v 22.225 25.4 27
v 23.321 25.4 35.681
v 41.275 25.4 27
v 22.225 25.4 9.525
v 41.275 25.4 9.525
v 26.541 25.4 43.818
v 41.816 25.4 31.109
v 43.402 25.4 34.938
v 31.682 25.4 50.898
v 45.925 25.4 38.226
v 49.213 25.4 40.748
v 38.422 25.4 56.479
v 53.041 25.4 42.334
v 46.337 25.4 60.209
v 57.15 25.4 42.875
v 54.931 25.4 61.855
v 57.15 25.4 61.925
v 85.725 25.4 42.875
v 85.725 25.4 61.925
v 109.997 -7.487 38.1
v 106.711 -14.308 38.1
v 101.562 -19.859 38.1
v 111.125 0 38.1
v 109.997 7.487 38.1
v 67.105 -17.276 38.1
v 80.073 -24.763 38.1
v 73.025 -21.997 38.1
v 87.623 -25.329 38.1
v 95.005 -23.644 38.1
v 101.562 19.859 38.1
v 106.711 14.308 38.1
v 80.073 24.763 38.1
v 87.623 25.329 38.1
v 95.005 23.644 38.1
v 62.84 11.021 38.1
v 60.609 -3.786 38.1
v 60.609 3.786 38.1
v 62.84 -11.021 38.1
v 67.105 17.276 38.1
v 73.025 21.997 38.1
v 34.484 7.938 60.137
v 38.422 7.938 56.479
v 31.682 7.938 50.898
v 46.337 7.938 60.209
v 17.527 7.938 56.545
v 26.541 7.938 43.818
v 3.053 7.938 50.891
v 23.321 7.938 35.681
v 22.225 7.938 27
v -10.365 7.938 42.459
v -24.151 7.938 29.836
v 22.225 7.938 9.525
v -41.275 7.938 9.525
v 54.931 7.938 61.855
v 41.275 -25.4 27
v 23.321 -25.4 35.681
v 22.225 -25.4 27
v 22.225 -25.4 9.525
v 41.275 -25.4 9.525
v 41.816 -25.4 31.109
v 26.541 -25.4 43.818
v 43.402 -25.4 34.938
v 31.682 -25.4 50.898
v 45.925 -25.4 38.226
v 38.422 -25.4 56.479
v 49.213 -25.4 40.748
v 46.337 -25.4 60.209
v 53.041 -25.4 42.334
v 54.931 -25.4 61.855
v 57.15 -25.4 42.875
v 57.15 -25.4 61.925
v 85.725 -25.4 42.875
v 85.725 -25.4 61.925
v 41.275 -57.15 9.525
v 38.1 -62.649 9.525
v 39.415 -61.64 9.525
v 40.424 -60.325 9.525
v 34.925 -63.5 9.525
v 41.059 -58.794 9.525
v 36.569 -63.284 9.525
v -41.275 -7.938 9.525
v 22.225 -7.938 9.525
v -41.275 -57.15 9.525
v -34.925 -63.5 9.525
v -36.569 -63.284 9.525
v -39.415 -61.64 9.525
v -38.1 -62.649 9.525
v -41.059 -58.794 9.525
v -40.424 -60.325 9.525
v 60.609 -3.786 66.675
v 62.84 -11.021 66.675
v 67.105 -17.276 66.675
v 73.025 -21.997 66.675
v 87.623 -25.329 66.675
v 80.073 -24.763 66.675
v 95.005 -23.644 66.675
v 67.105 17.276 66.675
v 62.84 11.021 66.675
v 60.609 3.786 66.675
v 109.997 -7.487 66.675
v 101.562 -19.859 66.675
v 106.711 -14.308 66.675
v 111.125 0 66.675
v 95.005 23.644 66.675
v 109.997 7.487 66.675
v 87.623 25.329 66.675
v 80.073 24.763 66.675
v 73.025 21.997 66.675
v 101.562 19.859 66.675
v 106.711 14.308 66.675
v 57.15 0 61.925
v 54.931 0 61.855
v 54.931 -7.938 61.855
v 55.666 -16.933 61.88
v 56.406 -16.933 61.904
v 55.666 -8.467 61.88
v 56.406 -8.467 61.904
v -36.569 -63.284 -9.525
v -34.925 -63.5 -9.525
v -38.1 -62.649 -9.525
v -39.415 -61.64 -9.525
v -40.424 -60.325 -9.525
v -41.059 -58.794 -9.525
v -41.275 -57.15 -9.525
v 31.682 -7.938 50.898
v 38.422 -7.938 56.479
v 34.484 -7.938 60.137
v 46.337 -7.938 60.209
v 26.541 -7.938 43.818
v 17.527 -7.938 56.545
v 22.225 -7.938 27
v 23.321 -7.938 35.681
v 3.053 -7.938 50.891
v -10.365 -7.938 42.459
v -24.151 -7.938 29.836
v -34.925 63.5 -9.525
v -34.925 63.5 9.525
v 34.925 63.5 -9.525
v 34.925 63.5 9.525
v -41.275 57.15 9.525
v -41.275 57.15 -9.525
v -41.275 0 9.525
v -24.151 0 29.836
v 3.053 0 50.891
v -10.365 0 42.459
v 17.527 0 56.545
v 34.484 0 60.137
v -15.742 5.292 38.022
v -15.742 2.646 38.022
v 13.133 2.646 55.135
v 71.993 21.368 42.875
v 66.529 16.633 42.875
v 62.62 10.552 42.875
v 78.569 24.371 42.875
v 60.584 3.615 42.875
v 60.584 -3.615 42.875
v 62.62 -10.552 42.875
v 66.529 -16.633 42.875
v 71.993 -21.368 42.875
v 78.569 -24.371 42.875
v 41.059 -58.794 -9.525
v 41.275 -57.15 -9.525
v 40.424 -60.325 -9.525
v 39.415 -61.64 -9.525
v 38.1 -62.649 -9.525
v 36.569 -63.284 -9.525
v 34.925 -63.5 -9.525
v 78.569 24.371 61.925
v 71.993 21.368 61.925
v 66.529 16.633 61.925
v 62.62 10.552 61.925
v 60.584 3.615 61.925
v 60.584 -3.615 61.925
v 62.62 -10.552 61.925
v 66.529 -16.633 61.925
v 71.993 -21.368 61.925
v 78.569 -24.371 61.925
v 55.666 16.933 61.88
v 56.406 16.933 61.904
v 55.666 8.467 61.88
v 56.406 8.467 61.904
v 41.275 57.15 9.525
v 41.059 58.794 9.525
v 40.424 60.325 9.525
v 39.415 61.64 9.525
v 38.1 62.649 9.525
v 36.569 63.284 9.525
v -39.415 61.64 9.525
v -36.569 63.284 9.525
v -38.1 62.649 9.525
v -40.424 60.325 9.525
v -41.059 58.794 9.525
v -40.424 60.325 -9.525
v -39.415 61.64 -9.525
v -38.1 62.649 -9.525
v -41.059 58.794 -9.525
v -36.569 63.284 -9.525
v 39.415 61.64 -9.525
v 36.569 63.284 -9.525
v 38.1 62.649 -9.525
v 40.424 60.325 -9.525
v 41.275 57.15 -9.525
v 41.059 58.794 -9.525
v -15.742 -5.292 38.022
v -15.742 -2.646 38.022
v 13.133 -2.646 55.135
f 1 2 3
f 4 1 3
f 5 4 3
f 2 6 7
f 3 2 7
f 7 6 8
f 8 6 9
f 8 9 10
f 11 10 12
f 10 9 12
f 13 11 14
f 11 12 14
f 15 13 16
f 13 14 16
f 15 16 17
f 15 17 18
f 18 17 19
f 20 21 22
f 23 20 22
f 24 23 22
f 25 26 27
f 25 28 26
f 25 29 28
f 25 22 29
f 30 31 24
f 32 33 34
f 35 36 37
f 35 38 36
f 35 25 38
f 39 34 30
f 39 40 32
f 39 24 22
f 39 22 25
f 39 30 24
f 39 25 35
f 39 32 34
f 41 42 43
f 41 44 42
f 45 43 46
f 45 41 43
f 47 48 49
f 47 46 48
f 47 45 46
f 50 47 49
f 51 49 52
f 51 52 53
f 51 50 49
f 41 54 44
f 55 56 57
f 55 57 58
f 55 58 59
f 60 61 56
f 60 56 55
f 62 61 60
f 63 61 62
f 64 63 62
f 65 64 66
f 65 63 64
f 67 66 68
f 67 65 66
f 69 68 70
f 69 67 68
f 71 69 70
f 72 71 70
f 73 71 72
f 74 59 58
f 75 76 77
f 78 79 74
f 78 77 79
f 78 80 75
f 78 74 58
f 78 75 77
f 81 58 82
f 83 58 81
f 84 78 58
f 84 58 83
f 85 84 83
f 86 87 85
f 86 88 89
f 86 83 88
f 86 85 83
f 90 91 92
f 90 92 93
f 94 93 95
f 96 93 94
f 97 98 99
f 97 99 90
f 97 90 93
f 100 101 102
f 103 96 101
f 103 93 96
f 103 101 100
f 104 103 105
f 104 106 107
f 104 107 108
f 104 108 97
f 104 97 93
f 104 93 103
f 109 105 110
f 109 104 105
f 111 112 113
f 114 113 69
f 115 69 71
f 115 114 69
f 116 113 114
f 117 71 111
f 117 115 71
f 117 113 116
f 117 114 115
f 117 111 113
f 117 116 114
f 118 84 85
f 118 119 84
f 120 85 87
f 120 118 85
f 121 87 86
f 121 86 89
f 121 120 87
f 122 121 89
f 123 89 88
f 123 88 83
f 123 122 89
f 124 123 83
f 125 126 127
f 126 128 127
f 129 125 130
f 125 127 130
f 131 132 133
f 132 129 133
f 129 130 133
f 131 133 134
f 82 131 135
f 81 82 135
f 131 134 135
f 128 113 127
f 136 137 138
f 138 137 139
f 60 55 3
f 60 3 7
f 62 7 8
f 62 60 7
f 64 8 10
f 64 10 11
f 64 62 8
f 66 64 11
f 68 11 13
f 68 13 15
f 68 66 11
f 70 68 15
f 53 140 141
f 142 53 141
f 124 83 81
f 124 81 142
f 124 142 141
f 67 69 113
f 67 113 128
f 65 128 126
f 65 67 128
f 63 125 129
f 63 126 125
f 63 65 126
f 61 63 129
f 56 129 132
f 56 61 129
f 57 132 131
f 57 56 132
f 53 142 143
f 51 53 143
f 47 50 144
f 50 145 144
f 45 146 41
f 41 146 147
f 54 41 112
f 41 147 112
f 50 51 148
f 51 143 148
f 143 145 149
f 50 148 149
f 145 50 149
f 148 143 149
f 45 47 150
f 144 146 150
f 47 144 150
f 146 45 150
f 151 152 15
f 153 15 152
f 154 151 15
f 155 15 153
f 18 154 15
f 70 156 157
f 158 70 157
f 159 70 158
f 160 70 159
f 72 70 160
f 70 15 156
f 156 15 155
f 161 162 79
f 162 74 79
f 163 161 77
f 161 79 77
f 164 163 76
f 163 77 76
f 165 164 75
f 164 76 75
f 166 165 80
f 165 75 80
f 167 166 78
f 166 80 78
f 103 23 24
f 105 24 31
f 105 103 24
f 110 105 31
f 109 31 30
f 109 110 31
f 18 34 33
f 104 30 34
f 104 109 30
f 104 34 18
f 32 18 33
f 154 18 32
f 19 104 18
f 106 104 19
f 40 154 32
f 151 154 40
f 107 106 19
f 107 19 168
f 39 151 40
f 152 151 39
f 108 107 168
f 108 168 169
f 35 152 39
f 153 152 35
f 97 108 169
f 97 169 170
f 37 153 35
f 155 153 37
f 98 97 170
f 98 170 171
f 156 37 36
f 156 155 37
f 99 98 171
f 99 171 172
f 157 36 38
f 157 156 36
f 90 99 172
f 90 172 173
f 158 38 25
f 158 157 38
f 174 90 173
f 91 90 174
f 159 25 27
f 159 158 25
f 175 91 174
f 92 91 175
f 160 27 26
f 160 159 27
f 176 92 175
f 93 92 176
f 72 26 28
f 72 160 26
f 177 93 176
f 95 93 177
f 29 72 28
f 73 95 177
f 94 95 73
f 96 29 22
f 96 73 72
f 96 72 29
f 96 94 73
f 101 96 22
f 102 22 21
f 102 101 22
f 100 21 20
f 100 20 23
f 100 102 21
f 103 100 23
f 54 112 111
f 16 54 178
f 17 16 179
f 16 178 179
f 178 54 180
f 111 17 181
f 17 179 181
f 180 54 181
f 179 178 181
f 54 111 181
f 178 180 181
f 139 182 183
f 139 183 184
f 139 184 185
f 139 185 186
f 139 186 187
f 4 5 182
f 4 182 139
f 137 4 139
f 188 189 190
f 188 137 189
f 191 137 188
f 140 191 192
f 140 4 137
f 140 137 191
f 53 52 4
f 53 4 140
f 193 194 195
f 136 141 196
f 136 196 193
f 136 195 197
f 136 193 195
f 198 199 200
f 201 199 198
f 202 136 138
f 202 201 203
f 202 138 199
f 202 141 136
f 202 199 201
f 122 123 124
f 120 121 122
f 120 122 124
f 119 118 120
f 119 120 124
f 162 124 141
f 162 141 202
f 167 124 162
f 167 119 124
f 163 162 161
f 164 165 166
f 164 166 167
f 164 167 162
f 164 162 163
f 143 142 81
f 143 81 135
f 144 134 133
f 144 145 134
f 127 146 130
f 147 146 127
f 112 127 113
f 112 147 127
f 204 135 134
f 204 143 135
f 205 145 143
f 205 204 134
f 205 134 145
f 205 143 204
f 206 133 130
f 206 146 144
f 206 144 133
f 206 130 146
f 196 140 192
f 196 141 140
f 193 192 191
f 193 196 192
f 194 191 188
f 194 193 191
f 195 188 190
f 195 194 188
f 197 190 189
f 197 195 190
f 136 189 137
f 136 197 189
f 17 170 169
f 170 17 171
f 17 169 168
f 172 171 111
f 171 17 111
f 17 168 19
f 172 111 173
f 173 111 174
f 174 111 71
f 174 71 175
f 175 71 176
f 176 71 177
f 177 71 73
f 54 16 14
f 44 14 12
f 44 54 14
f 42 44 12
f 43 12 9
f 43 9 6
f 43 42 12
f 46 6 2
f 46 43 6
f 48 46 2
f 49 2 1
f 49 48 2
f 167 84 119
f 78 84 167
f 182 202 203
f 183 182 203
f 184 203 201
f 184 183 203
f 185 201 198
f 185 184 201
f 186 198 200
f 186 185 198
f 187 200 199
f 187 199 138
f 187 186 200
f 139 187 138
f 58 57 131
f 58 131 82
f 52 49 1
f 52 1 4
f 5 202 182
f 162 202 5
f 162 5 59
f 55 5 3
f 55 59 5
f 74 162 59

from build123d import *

# Parameters (mm, degrees)
F1_DEPTH = 63.5
F2_DEPTH = 25.4
F3_DEPTH = 7.9375
F0_W     = 25.4
F0_H     = 19.05
F4_DEPTH = 25.4
F6_R     = 6.35


with BuildPart() as f1:
    # F0 (on Front) → F1 (new body, symmetric)
    with BuildSketch(Plane.XZ):
        Polygon((22.225, 9.525), (-41.275, 9.525), (-41.275, -9.525), (41.275, -9.525), (41.275, 9.525), align=None)
    extrude(amount=F1_DEPTH, both=True)

    # F0 (on Front) → F2 (join, symmetric)
    with BuildSketch(Plane.XZ):
        with BuildLine():
            Line((22.225, 27.0002), (22.225, 9.525))
            Line((22.225, 9.525), (41.275, 9.525))
            Line((41.275, 9.525), (41.275, 27.0002))
            ThreePointArc((41.275, 27.0002), (45.9246798487, 38.2255201513), (57.15, 42.8752))
            Line((57.15, 42.8752), (60.325, 42.8752))
            Line((60.325, 42.8752), (60.325, 61.9252))
            Line((60.325, 61.9252), (57.15, 61.9252))
            add(Edge.make_bspline(
                [(54.9309637921, 61.854633051), (55.6637542078, 61.8810124388), (56.4033914289, 61.9045304692), (57.15, 61.9252)],
                knots=[109.9388089339, 109.9388089339, 109.9388089339, 109.9388089339, 111.5045361635, 111.5045361635, 111.5045361635, 111.5045361635], degree=3))
            ThreePointArc((54.9309637921, 61.854633051), (31.6818290354, 50.8984822127), (22.225, 27.0002))
        make_face()
    extrude(amount=F2_DEPTH, both=True)

    # F0 (on Front) → F3 (join, symmetric)
    with BuildSketch(Plane.XZ):
        with BuildLine():
            add(Edge.make_bspline(
                [(-41.275, 9.525), (-14.2194517609, 44.0428960459), (3.4774896668, 60.0023829163), (54.9309637921, 61.854633051)],
                knots=[0, 0, 0, 0, 109.9388089339, 109.9388089339, 109.9388089339, 109.9388089339], degree=3))
            Line((-41.275, 9.525), (22.225, 9.525))
            Line((22.225, 9.525), (22.225, 27.0002))
            ThreePointArc((22.225, 27.0002), (31.6818290354, 50.8984822127), (54.9309637921, 61.854633051))
        make_face()
    extrude(amount=F3_DEPTH, both=True)

    # F0 (on Front) → F4 (join, symmetric)
    with BuildSketch(Plane.XZ):
        with Locations((73.025, 52.4002)):
            Rectangle(F0_W, F0_H)
    extrude(amount=F4_DEPTH, both=True)

    # F0 (on Front) → F5 (revolve)
    with BuildSketch(Plane.XZ):
        Polygon((85.725, 66.675), (85.725, 61.9252), (85.725, 42.8752), (85.725, 38.1), (111.125, 38.1), (111.125, 66.675), align=None)
    revolve(axis=Axis((85.725, 0, 52.3875), (0, 0, 1)))

    # F6
    f6_edges = [f1.edges().sort_by_distance(p)[0] for p in [
        (41.275, -63.5, 0),
        (-41.275, -63.5, 0),
        (41.275, 63.5, 0),
        (-41.275, 63.5, 0),
    ]]
    fillet(f6_edges, radius=F6_R)


solid = f1.part
